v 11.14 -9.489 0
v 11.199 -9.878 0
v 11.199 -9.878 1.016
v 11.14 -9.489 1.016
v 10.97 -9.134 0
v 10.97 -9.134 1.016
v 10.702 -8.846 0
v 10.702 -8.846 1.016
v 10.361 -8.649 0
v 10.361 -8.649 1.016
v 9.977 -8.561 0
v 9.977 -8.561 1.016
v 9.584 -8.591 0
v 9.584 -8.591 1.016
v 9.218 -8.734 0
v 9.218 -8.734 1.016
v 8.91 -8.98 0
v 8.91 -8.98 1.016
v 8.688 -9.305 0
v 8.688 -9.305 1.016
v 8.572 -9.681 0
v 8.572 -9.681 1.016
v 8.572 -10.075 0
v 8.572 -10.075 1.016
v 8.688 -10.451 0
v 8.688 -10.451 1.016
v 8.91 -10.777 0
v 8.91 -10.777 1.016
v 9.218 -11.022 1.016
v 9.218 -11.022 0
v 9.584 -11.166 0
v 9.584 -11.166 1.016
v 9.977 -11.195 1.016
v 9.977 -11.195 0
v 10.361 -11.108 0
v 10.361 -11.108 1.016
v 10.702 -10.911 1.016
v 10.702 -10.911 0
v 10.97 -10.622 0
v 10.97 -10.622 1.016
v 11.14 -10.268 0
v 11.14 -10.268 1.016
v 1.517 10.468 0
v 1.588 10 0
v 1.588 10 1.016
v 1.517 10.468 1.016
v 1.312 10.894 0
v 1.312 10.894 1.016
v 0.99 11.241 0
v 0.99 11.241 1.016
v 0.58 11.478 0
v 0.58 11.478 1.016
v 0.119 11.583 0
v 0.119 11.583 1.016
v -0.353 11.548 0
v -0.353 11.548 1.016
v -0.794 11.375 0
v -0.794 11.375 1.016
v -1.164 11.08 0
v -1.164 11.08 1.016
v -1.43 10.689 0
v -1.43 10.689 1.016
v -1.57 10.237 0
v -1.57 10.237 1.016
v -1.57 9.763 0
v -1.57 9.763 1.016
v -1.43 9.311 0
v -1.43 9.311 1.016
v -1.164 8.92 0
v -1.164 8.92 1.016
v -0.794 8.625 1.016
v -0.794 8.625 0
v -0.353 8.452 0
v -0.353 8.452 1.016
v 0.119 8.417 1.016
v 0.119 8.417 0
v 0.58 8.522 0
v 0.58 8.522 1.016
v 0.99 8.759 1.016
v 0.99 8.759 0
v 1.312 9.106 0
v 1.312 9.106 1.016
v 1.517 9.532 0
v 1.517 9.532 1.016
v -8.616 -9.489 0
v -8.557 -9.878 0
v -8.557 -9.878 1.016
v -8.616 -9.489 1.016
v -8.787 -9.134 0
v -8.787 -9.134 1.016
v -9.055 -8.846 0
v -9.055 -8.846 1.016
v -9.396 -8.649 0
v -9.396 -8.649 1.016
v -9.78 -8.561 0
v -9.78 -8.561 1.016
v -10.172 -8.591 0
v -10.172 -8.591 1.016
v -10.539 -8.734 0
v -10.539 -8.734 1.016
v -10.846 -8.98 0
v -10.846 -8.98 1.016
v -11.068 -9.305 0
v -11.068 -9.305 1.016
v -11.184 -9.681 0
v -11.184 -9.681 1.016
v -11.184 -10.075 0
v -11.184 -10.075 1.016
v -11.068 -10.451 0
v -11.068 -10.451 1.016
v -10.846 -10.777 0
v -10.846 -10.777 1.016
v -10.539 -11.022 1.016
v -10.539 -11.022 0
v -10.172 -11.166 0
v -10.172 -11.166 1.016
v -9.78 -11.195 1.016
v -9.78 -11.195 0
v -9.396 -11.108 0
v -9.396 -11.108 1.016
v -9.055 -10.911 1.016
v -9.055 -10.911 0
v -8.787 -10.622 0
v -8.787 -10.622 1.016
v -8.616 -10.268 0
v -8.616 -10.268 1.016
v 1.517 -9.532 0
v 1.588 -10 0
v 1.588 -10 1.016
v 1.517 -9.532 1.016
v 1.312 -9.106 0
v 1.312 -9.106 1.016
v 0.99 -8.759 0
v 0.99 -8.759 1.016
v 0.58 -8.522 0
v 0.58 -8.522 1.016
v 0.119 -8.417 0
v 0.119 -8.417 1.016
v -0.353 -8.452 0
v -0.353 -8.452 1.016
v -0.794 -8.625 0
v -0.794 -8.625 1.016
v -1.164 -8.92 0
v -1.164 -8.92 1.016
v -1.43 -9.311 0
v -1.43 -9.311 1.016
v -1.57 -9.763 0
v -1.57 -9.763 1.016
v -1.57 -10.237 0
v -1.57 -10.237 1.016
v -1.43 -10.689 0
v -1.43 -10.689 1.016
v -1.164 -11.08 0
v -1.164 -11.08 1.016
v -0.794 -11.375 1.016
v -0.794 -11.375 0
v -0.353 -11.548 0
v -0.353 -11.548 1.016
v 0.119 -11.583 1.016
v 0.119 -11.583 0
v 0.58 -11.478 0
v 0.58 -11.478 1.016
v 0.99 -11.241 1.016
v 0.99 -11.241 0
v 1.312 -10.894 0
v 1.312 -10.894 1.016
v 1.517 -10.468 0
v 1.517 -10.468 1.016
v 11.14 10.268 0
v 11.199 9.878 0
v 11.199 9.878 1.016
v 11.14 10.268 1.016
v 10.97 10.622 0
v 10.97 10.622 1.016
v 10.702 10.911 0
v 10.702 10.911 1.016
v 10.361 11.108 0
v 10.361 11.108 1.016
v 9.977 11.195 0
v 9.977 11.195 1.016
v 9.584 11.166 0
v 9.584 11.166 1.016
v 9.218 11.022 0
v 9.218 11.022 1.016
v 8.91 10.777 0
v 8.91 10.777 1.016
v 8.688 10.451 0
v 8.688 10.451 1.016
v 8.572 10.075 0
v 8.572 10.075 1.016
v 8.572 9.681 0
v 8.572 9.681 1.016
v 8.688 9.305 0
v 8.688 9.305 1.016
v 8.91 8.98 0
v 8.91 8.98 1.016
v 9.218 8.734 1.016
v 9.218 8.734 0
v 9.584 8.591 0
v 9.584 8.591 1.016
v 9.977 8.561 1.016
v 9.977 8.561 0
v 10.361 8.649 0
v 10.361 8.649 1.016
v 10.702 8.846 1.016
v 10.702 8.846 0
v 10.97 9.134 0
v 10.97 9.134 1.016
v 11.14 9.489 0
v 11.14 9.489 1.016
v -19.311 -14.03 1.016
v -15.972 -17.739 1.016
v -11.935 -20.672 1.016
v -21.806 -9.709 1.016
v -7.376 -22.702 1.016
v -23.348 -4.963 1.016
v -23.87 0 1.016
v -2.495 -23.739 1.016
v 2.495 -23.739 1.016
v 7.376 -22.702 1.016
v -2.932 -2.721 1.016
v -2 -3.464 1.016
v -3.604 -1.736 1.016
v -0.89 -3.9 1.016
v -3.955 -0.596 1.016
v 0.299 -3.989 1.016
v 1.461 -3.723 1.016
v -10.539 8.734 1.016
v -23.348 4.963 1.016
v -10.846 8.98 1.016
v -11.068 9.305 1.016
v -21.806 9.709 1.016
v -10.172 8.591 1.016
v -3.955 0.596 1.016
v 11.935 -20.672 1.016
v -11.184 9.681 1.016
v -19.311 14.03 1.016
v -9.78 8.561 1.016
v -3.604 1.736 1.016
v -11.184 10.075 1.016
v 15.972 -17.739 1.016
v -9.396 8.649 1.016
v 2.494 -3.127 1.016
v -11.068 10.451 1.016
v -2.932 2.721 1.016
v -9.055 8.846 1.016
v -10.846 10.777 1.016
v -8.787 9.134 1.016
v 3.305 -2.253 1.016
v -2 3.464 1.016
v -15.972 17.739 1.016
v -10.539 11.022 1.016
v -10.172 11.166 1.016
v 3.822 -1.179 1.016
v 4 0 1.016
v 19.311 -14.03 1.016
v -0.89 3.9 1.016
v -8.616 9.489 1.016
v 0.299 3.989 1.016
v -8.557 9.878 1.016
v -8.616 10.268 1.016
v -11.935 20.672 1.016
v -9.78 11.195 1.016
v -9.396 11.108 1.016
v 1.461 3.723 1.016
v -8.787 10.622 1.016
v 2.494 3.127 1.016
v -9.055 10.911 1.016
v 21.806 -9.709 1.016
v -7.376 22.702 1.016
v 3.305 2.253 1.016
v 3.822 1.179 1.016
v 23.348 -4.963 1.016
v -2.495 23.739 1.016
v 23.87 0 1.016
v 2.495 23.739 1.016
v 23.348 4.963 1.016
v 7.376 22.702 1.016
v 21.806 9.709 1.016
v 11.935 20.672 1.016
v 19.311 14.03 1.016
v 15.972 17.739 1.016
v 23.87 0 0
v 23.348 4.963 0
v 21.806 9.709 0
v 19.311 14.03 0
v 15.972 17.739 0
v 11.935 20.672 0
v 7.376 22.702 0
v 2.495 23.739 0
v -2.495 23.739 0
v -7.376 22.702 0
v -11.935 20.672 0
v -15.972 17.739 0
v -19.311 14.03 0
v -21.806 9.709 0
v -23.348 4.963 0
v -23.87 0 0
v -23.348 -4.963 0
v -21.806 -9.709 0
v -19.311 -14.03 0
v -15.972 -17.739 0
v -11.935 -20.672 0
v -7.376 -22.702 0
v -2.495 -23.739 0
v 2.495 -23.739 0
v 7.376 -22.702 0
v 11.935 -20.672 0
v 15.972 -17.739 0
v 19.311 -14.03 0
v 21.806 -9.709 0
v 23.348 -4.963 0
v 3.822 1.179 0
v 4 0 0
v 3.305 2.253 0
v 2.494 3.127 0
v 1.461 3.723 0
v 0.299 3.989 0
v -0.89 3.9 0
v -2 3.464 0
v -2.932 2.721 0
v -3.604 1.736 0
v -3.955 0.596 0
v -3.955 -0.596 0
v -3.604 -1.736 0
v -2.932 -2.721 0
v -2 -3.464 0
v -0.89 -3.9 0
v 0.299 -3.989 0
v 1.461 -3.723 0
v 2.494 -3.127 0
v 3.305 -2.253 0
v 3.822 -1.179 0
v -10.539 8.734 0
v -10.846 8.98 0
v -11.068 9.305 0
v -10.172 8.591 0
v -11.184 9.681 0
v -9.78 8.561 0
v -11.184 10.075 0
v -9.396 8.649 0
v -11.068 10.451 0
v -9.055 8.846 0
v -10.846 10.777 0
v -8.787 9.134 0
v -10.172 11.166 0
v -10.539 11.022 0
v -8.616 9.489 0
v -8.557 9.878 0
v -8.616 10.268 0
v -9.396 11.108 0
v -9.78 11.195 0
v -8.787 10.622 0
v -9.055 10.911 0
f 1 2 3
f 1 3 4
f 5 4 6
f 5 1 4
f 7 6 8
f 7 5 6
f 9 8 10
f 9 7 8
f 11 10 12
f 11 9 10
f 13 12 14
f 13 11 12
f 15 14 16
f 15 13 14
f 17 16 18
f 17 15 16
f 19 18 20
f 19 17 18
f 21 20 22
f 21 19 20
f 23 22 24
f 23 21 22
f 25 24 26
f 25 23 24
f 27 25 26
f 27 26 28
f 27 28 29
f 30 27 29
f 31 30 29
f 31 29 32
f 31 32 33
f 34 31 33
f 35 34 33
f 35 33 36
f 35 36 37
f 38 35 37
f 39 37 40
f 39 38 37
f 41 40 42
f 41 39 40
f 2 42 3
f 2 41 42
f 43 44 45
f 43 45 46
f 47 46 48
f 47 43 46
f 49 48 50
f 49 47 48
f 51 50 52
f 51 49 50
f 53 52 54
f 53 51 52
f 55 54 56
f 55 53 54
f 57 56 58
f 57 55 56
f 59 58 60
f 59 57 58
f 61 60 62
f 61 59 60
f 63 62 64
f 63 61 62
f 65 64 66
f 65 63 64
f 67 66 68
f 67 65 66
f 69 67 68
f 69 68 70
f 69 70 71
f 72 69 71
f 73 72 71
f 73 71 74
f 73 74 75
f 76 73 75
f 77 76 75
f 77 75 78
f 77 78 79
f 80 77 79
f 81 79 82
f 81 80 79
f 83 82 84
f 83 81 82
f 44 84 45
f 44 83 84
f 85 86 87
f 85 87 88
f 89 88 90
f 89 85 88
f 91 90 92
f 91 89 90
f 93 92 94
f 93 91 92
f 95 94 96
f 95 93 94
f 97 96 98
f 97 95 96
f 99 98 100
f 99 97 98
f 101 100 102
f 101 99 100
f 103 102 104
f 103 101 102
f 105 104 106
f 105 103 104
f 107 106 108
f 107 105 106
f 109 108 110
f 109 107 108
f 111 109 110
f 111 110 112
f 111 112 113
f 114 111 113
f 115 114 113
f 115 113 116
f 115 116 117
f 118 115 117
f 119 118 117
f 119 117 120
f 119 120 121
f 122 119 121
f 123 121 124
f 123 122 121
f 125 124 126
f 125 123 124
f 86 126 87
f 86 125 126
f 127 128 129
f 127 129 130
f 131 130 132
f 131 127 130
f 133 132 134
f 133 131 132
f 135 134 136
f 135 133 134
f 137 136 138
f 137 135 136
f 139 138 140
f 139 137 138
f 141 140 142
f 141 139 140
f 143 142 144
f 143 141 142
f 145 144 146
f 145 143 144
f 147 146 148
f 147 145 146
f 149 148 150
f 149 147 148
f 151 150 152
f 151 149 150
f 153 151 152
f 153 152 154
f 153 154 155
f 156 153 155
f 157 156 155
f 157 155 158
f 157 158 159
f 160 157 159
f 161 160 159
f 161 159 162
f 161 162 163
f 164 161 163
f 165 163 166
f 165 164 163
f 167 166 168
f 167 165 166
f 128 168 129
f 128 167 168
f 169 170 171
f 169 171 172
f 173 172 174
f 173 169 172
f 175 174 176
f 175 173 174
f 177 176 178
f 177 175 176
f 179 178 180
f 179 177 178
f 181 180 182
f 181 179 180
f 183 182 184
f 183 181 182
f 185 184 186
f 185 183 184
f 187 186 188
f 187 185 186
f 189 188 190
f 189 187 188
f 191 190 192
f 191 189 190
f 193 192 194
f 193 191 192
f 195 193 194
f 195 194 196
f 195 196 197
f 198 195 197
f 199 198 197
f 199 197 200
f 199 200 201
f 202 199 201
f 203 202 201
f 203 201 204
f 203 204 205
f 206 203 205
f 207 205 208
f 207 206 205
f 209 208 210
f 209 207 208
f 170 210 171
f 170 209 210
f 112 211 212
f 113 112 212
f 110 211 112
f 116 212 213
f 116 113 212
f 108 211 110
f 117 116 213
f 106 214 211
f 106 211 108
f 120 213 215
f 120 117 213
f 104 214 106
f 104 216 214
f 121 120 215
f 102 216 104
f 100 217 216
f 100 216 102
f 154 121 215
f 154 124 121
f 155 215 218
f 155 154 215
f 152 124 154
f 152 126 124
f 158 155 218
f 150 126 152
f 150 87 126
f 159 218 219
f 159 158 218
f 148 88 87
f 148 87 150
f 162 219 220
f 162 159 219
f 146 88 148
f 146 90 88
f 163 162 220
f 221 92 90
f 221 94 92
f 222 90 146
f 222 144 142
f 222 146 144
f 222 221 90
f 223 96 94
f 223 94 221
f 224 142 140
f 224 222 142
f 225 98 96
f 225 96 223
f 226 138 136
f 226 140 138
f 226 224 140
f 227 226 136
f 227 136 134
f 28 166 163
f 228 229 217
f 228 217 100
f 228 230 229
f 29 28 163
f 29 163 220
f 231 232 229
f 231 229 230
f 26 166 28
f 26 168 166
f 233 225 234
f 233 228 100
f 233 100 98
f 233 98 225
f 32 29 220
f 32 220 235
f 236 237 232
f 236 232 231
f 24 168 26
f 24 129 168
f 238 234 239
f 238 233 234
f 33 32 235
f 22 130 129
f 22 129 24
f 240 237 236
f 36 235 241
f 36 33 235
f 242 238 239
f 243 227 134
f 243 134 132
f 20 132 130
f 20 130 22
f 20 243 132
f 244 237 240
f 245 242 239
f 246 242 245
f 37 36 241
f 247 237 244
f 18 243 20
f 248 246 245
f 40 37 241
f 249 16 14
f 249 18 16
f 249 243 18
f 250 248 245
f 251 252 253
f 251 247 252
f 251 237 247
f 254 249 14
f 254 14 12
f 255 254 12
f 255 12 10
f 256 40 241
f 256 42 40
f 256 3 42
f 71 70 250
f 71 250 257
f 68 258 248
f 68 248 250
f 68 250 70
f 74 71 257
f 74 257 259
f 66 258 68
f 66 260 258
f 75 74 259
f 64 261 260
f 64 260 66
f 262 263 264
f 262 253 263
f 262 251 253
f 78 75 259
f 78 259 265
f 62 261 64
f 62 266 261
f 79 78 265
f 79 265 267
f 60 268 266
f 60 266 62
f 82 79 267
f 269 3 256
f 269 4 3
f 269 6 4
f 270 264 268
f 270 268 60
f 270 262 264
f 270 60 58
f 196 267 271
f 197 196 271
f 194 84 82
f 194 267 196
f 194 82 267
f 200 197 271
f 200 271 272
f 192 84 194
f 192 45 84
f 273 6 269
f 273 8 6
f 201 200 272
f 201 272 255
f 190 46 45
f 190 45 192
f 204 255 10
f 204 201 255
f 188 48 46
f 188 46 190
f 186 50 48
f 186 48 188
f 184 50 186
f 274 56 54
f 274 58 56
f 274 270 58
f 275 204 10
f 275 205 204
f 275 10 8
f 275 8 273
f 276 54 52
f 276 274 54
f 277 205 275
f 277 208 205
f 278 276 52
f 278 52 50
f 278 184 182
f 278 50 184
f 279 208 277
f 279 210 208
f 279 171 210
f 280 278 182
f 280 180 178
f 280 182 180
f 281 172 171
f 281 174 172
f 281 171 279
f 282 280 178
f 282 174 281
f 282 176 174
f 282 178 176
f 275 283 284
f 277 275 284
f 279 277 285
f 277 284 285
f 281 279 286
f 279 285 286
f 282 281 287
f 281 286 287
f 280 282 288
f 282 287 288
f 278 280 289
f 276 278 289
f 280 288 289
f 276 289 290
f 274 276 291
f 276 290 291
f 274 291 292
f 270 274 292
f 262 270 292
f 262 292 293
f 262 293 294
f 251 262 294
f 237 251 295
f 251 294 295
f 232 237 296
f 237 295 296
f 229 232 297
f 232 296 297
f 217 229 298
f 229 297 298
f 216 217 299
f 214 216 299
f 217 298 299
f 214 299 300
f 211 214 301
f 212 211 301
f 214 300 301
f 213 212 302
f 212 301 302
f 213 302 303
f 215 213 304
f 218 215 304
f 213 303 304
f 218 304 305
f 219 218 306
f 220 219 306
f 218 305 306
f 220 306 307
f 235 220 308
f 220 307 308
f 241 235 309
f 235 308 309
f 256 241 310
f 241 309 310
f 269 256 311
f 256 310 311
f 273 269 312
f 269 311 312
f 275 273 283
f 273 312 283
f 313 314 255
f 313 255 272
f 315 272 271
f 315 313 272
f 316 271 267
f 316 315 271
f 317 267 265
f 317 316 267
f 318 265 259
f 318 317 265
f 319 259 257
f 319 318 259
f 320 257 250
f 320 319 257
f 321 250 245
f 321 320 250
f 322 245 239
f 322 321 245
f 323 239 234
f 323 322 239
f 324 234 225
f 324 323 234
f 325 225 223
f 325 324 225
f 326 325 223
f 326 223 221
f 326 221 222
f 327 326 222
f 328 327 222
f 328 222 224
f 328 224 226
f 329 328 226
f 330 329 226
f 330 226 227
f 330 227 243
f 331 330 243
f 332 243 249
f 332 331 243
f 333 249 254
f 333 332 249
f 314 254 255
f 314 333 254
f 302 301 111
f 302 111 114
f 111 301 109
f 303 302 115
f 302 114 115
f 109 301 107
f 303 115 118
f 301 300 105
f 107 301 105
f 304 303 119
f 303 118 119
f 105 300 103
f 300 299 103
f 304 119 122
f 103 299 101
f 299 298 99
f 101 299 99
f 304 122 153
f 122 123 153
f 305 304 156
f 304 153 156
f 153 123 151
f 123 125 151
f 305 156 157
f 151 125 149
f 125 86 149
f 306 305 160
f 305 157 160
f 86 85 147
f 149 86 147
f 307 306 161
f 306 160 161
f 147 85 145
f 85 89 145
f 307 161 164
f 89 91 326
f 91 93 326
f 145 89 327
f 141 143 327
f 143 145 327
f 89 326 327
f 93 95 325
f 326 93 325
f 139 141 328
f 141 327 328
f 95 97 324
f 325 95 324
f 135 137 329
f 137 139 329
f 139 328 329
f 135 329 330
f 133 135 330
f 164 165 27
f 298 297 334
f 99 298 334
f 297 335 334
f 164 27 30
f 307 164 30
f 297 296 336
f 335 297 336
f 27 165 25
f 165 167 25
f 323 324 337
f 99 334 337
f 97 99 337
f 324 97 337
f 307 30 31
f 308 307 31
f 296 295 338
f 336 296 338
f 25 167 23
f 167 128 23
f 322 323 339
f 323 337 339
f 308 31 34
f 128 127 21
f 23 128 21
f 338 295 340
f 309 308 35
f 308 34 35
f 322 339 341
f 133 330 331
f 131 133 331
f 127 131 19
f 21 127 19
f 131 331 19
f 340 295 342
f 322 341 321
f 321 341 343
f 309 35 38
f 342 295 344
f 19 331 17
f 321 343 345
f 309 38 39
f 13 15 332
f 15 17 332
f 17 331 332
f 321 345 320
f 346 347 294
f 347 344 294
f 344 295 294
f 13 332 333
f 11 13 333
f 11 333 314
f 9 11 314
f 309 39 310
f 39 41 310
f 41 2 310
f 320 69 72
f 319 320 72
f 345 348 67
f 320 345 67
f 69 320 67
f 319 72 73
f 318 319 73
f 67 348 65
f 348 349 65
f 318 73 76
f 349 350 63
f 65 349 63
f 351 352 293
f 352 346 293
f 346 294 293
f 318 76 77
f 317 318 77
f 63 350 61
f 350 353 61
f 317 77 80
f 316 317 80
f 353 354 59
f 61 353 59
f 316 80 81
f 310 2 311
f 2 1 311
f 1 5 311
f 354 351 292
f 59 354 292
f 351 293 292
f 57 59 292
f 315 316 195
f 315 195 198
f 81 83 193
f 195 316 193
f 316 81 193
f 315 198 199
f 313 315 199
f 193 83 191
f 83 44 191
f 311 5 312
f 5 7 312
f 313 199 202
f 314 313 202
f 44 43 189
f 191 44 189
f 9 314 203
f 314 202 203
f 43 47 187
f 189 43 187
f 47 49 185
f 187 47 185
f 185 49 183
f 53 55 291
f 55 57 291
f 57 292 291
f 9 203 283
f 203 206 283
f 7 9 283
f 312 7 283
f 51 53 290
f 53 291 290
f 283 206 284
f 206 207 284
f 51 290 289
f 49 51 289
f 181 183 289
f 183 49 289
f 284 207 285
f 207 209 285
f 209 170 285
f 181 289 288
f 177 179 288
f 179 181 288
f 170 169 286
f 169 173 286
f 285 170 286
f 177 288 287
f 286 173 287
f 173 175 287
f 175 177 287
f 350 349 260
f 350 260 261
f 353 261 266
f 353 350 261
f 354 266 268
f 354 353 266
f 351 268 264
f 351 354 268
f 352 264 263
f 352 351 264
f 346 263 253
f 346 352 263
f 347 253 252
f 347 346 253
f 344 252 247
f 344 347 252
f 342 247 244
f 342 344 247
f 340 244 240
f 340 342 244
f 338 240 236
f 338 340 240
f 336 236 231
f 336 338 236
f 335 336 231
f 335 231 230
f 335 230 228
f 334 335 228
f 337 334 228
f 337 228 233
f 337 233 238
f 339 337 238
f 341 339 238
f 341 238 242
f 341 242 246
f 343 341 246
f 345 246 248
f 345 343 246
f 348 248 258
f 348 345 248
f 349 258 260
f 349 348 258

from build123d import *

# Parameters (mm, degrees)
SKETCH1_R           = 23.87
SKETCH1_R_2         = 1.5875
SKETCH1_R_3         = 1.3208
SKETCH1_R_4         = 4
BOSS_EXTRUDE2_DEPTH = 1.016


with BuildPart() as part:
    # Sketch1 → Boss-Extrude2 (new body)
    with BuildSketch(Plane.XY):
        Circle(SKETCH1_R)
        with Locations((0, 10)):
            Circle(SKETCH1_R_2, mode=Mode.SUBTRACT)
        with Locations((9.878281733, -9.878281733)):
            Circle(SKETCH1_R_3, mode=Mode.SUBTRACT)
        with Locations((9.878281733, 9.878281733)):
            Circle(SKETCH1_R_3, mode=Mode.SUBTRACT)
        with Locations((-9.878281733, -9.878281733)):
            Circle(SKETCH1_R_3, mode=Mode.SUBTRACT)
        with Locations((-9.878281733, 9.878281733)):
            Circle(SKETCH1_R_3, mode=Mode.SUBTRACT)
        Circle(SKETCH1_R_4, mode=Mode.SUBTRACT)
        with Locations((0, -10)):
            Circle(SKETCH1_R_2, mode=Mode.SUBTRACT)
    extrude(amount=BOSS_EXTRUDE2_DEPTH)


solid = part.part
